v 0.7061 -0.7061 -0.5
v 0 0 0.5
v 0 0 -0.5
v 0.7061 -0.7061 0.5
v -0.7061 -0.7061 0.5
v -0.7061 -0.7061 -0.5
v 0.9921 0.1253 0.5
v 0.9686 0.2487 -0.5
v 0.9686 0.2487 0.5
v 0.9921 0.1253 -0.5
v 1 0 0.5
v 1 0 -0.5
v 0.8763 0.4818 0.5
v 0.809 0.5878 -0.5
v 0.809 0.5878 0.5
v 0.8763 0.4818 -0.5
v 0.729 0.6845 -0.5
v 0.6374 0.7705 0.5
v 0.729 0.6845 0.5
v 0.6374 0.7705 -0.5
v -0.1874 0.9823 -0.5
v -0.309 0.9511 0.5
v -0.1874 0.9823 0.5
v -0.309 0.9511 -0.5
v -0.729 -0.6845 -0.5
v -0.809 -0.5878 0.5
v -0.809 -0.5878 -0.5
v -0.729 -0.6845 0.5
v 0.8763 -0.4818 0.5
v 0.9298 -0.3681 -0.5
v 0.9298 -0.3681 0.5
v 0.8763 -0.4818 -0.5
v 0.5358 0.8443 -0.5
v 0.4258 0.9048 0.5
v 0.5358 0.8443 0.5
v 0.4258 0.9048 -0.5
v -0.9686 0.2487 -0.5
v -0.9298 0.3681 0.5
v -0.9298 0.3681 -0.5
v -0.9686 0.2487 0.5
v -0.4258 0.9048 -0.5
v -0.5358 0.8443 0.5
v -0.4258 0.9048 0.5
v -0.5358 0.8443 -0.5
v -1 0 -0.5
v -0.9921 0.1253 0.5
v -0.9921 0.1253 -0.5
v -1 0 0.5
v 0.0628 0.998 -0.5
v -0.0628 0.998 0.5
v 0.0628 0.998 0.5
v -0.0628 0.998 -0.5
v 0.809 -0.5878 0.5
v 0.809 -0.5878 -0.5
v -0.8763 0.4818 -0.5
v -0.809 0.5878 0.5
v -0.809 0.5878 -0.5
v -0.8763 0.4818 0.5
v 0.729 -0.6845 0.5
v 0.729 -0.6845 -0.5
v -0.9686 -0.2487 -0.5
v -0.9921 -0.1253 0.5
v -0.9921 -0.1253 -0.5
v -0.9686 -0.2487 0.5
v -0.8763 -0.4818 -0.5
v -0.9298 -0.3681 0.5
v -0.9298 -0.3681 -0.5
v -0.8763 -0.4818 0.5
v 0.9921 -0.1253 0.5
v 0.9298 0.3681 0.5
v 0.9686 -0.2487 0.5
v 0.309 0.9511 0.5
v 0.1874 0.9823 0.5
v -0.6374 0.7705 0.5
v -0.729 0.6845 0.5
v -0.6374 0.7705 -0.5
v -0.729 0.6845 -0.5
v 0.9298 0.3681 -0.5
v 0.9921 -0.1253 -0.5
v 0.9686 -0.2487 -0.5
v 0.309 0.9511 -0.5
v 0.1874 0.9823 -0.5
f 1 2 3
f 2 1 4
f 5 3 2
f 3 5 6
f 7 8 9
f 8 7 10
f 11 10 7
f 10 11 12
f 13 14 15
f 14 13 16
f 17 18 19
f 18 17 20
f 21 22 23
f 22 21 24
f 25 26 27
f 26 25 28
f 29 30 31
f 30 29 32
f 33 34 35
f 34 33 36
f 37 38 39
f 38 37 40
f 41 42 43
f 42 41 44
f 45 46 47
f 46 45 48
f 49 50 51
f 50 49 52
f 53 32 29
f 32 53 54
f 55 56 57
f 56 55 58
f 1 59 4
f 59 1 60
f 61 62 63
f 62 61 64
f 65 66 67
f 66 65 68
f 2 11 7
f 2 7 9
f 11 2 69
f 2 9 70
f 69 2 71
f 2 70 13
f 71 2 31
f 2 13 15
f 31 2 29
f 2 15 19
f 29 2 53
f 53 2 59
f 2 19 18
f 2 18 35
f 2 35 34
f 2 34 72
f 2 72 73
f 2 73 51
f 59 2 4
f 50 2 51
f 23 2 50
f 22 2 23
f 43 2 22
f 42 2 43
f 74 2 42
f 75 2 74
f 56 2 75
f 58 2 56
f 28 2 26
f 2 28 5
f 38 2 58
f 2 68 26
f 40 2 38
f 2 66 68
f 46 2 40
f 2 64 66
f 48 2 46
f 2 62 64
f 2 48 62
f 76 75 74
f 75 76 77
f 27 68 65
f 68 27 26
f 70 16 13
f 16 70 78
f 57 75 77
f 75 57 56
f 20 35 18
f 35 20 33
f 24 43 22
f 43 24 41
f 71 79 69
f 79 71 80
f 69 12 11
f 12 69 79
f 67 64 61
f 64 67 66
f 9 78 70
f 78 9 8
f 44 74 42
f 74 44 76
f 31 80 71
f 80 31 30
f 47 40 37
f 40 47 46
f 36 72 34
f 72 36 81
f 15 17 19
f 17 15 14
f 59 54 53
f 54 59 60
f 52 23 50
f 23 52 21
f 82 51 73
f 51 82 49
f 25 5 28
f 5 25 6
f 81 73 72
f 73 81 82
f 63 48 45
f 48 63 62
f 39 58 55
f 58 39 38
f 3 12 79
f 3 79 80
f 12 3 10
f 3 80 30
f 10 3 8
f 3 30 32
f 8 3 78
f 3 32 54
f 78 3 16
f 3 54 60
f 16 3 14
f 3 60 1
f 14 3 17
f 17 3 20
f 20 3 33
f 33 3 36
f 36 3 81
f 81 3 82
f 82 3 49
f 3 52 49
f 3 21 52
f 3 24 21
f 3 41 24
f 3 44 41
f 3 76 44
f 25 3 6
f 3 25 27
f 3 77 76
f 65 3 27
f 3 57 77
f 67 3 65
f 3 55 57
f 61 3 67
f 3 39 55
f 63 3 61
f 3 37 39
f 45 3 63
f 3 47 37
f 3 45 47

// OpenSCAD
// Copyright 2013 Jonathan Hulka
// This program is free software; you can redistribute it and/or modify
// it under the terms of the GNU General Public License as published by
// the Free Software Foundation; either version 2 of the License, or
// (at your option) any later version.
// 
// This program is distributed in the hope that it will be useful,
// but WITHOUT ANY WARRANTY; without even the implied warranty of
// MERCHANTABILITY or FITNESS FOR A PARTICULAR PURPOSE.  See the
// GNU General Public License for more details.
// 
// You should have received a copy of the GNU General Public License
// along with this program; if not, write to the Free Software
// Foundation, Inc., 51 Franklin Street, Fifth Floor, Boston,
// MA 02110-1301, USA.


//Creates a wedge-shaped section of a cylinder
//The result is centered with the open part of the wedge facing in the positive y direction
//h - height
//r - radius
//a - angle
//$fn=100;
module wedge(h, r, a, $fn=50)
{
    th=(a%360)/2;
    difference()
    {
        cylinder(h=h,r=r,center=true, $fn=$fn);
        if(th<90)
        {
            for(n=[-1,1])rotate(-th*n)translate([(r+0.5)*n,0,0])
                cube(size=[r*2+1,r*2+1,h+1],center=true);
        }
        else
        {
            intersection()
            {
                rotate(-th)translate([(r+0.5),(r+0.5),0])
                    cube(size=[r*2+1,r*2+1,h+1],center=true);
                rotate(th)translate([-(r+0.5),(r+0.5),0])
                    cube(size=[r*2+1,r*2+1,h+1],center=true);
            }
        }
    }
}

wedge(h=1, r=1, a=270);
